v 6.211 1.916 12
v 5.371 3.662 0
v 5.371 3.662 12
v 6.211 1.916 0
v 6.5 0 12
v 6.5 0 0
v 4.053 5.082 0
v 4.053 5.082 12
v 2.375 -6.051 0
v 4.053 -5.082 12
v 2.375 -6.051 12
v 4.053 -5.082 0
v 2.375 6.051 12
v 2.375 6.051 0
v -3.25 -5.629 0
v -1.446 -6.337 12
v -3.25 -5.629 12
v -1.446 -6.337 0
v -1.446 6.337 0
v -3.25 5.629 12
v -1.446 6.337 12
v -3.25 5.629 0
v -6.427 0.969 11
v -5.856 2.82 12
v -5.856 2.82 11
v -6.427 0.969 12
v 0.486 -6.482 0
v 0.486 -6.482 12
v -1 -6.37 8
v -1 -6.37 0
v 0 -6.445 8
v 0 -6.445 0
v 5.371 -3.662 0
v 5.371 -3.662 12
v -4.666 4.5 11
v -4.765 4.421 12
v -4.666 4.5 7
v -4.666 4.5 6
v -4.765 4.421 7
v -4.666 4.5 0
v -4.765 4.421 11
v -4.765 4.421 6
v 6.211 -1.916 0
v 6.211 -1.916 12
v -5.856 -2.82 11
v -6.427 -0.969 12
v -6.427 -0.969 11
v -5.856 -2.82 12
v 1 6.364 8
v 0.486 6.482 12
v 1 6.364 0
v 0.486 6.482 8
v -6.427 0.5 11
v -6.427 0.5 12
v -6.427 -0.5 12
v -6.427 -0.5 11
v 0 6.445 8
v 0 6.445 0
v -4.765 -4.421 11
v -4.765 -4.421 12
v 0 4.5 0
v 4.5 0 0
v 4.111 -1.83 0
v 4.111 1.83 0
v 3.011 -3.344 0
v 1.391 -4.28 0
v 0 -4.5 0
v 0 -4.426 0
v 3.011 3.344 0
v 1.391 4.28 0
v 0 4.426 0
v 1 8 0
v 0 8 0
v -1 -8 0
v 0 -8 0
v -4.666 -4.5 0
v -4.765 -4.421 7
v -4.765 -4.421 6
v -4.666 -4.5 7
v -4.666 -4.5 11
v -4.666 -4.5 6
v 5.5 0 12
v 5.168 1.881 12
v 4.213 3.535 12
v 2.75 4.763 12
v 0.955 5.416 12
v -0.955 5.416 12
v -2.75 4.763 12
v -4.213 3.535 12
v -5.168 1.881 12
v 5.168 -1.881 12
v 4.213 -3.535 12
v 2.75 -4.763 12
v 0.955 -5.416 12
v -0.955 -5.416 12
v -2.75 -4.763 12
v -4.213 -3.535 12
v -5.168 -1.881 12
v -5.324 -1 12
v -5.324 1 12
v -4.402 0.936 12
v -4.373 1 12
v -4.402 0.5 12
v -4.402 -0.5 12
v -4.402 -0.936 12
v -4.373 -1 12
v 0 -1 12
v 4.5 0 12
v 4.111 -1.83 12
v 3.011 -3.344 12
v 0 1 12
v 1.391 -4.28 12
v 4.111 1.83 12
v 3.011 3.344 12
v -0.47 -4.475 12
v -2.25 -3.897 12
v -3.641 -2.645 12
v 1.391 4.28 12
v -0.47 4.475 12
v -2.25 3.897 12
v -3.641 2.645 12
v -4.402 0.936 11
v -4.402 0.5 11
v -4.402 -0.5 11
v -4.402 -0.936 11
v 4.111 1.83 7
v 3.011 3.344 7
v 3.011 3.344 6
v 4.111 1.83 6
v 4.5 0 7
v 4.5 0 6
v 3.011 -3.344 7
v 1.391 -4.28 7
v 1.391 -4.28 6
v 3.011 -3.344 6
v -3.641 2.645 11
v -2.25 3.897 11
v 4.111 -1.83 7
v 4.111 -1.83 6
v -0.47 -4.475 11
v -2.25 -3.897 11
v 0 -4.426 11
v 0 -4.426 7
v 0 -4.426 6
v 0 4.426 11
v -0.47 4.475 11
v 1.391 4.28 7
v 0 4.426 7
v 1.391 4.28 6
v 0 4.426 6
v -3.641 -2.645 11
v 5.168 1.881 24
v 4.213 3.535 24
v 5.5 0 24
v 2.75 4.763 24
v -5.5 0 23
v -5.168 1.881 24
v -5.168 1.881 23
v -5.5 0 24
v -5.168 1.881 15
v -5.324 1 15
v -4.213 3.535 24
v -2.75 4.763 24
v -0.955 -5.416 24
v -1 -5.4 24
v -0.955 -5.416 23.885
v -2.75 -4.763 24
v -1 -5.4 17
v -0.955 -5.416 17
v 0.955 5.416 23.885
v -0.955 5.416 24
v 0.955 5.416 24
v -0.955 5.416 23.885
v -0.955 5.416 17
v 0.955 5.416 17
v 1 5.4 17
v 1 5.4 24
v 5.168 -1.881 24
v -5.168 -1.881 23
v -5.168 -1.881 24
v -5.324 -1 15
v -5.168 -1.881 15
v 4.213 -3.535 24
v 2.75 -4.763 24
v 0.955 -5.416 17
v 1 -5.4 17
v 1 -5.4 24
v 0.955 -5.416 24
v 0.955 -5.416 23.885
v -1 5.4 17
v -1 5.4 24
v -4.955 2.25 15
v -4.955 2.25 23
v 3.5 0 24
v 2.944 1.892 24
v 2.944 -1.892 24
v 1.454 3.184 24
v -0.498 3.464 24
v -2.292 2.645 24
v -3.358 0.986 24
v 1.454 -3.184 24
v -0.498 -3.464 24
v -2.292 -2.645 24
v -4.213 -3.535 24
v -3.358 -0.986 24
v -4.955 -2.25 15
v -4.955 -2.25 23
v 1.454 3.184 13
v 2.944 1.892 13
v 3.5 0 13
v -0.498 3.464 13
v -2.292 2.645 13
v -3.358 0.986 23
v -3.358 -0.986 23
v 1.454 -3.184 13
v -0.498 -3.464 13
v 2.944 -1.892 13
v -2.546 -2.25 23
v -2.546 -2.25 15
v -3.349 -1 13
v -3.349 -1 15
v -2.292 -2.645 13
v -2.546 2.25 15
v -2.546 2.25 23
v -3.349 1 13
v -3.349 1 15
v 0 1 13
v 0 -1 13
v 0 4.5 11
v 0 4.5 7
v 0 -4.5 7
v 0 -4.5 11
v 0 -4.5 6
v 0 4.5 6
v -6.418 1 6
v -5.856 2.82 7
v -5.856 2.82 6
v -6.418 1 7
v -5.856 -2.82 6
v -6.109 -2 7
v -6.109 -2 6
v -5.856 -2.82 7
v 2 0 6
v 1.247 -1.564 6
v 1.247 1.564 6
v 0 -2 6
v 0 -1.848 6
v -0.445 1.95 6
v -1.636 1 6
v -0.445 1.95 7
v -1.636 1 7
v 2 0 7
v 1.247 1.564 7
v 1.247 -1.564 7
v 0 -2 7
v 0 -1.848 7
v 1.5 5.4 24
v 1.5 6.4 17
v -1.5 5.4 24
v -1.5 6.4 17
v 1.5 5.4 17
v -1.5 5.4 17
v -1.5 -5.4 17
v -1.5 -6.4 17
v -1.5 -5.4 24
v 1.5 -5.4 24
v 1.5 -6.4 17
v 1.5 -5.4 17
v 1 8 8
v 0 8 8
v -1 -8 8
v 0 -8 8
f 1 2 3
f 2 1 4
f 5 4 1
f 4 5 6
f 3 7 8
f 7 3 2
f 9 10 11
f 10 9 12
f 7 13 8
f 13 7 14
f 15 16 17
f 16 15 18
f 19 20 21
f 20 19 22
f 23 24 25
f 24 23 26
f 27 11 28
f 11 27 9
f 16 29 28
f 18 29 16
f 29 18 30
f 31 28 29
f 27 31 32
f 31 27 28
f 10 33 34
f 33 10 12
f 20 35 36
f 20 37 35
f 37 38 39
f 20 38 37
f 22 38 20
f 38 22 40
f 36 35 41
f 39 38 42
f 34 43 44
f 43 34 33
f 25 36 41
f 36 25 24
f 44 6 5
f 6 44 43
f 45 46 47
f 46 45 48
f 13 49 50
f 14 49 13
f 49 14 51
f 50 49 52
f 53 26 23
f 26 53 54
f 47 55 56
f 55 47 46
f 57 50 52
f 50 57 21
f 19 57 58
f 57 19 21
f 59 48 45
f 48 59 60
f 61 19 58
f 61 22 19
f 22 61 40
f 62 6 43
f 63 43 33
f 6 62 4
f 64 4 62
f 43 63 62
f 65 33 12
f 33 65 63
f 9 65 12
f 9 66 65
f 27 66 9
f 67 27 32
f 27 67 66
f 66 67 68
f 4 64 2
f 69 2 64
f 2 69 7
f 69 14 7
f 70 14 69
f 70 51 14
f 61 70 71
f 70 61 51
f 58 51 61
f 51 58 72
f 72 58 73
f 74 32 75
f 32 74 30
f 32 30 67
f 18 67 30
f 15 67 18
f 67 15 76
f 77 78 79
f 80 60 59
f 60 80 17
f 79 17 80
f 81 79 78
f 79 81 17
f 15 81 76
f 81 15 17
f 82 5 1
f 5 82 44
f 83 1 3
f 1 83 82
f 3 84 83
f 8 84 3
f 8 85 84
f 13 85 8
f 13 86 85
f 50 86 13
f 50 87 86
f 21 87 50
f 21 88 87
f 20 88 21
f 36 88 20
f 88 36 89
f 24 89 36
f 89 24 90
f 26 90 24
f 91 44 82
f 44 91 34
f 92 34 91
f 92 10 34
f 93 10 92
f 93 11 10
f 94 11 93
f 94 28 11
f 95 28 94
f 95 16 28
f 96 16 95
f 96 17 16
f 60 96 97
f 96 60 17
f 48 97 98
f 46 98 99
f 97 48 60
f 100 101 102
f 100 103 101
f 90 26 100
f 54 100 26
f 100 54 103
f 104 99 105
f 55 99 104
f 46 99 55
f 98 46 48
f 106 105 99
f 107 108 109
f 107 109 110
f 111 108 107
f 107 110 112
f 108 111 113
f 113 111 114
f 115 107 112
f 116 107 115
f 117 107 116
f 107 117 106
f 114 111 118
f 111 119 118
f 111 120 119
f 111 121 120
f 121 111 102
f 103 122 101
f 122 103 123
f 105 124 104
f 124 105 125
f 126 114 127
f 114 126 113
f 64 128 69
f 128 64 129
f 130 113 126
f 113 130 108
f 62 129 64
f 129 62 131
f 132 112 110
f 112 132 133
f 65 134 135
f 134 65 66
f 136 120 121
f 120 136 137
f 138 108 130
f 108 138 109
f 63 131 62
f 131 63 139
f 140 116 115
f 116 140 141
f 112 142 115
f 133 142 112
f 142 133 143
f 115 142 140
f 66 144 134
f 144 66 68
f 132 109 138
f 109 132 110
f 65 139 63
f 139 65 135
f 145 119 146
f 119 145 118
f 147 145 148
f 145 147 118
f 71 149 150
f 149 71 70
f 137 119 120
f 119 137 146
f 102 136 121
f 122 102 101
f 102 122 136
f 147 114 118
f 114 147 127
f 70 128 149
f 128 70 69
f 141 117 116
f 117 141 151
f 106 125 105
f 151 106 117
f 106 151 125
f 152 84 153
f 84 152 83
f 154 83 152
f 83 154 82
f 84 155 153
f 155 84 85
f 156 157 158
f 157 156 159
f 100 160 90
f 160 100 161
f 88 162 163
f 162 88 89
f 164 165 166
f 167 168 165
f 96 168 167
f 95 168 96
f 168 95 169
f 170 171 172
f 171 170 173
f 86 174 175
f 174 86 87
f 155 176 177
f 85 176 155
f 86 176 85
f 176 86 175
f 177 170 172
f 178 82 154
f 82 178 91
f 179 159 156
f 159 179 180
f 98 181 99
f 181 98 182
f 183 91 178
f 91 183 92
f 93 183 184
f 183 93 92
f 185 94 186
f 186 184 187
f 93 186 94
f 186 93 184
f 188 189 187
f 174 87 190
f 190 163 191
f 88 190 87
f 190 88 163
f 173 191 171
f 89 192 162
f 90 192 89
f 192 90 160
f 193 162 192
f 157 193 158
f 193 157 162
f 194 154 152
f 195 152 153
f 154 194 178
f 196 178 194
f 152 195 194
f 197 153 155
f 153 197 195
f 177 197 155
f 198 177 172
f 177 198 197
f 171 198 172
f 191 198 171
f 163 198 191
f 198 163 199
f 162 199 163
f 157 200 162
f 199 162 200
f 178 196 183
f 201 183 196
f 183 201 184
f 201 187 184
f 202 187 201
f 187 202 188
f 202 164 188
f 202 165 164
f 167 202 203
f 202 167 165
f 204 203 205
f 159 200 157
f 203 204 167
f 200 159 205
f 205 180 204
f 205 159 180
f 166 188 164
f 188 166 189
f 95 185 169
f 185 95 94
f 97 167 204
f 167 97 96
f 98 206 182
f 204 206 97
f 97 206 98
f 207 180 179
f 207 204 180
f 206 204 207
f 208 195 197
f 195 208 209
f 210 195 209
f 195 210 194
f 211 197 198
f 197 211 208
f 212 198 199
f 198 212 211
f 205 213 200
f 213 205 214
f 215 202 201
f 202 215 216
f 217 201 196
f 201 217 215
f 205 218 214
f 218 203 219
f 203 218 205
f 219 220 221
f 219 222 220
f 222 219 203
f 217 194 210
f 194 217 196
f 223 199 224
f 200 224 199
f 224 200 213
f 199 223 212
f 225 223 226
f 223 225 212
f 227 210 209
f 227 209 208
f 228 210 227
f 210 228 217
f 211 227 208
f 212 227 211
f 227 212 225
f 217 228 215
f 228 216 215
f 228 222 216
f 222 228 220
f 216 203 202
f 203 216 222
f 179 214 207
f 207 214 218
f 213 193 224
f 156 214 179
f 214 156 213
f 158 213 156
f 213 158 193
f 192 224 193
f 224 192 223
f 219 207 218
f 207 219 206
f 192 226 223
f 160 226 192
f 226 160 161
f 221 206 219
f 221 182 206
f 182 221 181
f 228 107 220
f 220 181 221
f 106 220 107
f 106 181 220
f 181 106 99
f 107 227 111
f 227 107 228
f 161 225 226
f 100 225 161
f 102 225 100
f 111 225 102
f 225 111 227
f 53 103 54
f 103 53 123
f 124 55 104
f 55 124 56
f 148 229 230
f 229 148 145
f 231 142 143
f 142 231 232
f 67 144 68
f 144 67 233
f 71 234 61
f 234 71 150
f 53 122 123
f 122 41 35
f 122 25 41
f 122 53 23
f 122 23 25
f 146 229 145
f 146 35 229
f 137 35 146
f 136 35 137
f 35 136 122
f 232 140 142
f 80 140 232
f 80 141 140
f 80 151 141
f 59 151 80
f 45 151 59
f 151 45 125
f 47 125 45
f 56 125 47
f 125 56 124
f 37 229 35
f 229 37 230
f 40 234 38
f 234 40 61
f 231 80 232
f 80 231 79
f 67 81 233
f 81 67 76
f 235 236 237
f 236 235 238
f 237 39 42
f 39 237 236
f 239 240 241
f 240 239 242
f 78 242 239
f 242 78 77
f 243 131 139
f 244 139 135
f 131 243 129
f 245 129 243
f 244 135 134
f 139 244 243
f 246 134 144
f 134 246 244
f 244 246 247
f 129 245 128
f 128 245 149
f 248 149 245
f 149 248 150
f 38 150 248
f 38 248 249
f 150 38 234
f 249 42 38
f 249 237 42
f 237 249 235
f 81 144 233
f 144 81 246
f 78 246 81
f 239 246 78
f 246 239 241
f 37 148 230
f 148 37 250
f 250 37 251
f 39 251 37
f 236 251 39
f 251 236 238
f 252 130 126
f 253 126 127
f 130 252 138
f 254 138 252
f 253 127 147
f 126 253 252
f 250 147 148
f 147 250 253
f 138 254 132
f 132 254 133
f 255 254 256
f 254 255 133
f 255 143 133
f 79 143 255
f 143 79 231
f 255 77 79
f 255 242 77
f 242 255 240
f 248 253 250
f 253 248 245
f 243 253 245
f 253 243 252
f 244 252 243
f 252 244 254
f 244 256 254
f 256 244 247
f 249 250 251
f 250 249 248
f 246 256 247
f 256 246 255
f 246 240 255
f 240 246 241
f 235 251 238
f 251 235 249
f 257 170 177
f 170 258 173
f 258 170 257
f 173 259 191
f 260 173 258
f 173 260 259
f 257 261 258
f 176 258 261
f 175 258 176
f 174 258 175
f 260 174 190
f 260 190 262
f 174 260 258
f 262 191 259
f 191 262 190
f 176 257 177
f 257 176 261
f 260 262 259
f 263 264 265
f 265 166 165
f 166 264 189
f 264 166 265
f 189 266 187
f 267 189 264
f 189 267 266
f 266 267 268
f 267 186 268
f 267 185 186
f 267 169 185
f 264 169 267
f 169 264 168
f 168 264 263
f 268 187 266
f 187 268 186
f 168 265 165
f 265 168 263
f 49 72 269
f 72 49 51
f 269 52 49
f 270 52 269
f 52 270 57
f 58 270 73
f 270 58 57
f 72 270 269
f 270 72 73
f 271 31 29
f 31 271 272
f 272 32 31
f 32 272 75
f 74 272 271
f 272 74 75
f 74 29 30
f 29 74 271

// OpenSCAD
module prism(l, w, h) {
    polyhedron(
       points=[[0,0,0], [0,w,h], [l,w,h], [l,0,0], [0,w,0], [l,w,0]],
       faces=[[0,1,2,3],[2,1,4,5], [0,3,5,4], [0,4,1], [3,2,5]]
   );
}
               
difference() {
    union() {
        difference() {
            cylinder(h=12, r=6.5);
            translate([0,0,-1]) cylinder(h=13, r=4.5);
        }
    
        translate([0,0,12]) {
            difference() {
                cylinder(h=12, r=5.5);
                translate([0,0,1]) cylinder(h=13, r=3.5);
        
                rotate([0,0,90]) translate([0,10,7]) cube([4.5,20,8], center = true);

                rotate([0,0,90]) translate([0,10,1]) cube([2,20,6], center = true);
            }
        }
    }
    
    translate([0,0.5,-1]) rotate([0,0,180]) cube([7,1,23]);
    translate([-7,-4.5,-2]) cube([7,9,13]);
}

translate([-1.5,5.4,24]) rotate([270,0,00]) prism(3, 7, 1);

rotate([0,0,180]) translate([-1.5,5.4,24]) rotate([270,0,00]) prism(3, 7, 1);


translate([0,0,6]) difference() {
    cylinder(h=1, r=6.5);
    translate([0,0,-1]) cylinder(h=2, r=2);
    translate([0,1,-1]) rotate([0,0,180]) cube([7,3,23]);
}

translate([0,6,0]) cube([1,2,8]);
rotate([0,0,180]) translate([0,6,0]) cube([1,2,8]);
